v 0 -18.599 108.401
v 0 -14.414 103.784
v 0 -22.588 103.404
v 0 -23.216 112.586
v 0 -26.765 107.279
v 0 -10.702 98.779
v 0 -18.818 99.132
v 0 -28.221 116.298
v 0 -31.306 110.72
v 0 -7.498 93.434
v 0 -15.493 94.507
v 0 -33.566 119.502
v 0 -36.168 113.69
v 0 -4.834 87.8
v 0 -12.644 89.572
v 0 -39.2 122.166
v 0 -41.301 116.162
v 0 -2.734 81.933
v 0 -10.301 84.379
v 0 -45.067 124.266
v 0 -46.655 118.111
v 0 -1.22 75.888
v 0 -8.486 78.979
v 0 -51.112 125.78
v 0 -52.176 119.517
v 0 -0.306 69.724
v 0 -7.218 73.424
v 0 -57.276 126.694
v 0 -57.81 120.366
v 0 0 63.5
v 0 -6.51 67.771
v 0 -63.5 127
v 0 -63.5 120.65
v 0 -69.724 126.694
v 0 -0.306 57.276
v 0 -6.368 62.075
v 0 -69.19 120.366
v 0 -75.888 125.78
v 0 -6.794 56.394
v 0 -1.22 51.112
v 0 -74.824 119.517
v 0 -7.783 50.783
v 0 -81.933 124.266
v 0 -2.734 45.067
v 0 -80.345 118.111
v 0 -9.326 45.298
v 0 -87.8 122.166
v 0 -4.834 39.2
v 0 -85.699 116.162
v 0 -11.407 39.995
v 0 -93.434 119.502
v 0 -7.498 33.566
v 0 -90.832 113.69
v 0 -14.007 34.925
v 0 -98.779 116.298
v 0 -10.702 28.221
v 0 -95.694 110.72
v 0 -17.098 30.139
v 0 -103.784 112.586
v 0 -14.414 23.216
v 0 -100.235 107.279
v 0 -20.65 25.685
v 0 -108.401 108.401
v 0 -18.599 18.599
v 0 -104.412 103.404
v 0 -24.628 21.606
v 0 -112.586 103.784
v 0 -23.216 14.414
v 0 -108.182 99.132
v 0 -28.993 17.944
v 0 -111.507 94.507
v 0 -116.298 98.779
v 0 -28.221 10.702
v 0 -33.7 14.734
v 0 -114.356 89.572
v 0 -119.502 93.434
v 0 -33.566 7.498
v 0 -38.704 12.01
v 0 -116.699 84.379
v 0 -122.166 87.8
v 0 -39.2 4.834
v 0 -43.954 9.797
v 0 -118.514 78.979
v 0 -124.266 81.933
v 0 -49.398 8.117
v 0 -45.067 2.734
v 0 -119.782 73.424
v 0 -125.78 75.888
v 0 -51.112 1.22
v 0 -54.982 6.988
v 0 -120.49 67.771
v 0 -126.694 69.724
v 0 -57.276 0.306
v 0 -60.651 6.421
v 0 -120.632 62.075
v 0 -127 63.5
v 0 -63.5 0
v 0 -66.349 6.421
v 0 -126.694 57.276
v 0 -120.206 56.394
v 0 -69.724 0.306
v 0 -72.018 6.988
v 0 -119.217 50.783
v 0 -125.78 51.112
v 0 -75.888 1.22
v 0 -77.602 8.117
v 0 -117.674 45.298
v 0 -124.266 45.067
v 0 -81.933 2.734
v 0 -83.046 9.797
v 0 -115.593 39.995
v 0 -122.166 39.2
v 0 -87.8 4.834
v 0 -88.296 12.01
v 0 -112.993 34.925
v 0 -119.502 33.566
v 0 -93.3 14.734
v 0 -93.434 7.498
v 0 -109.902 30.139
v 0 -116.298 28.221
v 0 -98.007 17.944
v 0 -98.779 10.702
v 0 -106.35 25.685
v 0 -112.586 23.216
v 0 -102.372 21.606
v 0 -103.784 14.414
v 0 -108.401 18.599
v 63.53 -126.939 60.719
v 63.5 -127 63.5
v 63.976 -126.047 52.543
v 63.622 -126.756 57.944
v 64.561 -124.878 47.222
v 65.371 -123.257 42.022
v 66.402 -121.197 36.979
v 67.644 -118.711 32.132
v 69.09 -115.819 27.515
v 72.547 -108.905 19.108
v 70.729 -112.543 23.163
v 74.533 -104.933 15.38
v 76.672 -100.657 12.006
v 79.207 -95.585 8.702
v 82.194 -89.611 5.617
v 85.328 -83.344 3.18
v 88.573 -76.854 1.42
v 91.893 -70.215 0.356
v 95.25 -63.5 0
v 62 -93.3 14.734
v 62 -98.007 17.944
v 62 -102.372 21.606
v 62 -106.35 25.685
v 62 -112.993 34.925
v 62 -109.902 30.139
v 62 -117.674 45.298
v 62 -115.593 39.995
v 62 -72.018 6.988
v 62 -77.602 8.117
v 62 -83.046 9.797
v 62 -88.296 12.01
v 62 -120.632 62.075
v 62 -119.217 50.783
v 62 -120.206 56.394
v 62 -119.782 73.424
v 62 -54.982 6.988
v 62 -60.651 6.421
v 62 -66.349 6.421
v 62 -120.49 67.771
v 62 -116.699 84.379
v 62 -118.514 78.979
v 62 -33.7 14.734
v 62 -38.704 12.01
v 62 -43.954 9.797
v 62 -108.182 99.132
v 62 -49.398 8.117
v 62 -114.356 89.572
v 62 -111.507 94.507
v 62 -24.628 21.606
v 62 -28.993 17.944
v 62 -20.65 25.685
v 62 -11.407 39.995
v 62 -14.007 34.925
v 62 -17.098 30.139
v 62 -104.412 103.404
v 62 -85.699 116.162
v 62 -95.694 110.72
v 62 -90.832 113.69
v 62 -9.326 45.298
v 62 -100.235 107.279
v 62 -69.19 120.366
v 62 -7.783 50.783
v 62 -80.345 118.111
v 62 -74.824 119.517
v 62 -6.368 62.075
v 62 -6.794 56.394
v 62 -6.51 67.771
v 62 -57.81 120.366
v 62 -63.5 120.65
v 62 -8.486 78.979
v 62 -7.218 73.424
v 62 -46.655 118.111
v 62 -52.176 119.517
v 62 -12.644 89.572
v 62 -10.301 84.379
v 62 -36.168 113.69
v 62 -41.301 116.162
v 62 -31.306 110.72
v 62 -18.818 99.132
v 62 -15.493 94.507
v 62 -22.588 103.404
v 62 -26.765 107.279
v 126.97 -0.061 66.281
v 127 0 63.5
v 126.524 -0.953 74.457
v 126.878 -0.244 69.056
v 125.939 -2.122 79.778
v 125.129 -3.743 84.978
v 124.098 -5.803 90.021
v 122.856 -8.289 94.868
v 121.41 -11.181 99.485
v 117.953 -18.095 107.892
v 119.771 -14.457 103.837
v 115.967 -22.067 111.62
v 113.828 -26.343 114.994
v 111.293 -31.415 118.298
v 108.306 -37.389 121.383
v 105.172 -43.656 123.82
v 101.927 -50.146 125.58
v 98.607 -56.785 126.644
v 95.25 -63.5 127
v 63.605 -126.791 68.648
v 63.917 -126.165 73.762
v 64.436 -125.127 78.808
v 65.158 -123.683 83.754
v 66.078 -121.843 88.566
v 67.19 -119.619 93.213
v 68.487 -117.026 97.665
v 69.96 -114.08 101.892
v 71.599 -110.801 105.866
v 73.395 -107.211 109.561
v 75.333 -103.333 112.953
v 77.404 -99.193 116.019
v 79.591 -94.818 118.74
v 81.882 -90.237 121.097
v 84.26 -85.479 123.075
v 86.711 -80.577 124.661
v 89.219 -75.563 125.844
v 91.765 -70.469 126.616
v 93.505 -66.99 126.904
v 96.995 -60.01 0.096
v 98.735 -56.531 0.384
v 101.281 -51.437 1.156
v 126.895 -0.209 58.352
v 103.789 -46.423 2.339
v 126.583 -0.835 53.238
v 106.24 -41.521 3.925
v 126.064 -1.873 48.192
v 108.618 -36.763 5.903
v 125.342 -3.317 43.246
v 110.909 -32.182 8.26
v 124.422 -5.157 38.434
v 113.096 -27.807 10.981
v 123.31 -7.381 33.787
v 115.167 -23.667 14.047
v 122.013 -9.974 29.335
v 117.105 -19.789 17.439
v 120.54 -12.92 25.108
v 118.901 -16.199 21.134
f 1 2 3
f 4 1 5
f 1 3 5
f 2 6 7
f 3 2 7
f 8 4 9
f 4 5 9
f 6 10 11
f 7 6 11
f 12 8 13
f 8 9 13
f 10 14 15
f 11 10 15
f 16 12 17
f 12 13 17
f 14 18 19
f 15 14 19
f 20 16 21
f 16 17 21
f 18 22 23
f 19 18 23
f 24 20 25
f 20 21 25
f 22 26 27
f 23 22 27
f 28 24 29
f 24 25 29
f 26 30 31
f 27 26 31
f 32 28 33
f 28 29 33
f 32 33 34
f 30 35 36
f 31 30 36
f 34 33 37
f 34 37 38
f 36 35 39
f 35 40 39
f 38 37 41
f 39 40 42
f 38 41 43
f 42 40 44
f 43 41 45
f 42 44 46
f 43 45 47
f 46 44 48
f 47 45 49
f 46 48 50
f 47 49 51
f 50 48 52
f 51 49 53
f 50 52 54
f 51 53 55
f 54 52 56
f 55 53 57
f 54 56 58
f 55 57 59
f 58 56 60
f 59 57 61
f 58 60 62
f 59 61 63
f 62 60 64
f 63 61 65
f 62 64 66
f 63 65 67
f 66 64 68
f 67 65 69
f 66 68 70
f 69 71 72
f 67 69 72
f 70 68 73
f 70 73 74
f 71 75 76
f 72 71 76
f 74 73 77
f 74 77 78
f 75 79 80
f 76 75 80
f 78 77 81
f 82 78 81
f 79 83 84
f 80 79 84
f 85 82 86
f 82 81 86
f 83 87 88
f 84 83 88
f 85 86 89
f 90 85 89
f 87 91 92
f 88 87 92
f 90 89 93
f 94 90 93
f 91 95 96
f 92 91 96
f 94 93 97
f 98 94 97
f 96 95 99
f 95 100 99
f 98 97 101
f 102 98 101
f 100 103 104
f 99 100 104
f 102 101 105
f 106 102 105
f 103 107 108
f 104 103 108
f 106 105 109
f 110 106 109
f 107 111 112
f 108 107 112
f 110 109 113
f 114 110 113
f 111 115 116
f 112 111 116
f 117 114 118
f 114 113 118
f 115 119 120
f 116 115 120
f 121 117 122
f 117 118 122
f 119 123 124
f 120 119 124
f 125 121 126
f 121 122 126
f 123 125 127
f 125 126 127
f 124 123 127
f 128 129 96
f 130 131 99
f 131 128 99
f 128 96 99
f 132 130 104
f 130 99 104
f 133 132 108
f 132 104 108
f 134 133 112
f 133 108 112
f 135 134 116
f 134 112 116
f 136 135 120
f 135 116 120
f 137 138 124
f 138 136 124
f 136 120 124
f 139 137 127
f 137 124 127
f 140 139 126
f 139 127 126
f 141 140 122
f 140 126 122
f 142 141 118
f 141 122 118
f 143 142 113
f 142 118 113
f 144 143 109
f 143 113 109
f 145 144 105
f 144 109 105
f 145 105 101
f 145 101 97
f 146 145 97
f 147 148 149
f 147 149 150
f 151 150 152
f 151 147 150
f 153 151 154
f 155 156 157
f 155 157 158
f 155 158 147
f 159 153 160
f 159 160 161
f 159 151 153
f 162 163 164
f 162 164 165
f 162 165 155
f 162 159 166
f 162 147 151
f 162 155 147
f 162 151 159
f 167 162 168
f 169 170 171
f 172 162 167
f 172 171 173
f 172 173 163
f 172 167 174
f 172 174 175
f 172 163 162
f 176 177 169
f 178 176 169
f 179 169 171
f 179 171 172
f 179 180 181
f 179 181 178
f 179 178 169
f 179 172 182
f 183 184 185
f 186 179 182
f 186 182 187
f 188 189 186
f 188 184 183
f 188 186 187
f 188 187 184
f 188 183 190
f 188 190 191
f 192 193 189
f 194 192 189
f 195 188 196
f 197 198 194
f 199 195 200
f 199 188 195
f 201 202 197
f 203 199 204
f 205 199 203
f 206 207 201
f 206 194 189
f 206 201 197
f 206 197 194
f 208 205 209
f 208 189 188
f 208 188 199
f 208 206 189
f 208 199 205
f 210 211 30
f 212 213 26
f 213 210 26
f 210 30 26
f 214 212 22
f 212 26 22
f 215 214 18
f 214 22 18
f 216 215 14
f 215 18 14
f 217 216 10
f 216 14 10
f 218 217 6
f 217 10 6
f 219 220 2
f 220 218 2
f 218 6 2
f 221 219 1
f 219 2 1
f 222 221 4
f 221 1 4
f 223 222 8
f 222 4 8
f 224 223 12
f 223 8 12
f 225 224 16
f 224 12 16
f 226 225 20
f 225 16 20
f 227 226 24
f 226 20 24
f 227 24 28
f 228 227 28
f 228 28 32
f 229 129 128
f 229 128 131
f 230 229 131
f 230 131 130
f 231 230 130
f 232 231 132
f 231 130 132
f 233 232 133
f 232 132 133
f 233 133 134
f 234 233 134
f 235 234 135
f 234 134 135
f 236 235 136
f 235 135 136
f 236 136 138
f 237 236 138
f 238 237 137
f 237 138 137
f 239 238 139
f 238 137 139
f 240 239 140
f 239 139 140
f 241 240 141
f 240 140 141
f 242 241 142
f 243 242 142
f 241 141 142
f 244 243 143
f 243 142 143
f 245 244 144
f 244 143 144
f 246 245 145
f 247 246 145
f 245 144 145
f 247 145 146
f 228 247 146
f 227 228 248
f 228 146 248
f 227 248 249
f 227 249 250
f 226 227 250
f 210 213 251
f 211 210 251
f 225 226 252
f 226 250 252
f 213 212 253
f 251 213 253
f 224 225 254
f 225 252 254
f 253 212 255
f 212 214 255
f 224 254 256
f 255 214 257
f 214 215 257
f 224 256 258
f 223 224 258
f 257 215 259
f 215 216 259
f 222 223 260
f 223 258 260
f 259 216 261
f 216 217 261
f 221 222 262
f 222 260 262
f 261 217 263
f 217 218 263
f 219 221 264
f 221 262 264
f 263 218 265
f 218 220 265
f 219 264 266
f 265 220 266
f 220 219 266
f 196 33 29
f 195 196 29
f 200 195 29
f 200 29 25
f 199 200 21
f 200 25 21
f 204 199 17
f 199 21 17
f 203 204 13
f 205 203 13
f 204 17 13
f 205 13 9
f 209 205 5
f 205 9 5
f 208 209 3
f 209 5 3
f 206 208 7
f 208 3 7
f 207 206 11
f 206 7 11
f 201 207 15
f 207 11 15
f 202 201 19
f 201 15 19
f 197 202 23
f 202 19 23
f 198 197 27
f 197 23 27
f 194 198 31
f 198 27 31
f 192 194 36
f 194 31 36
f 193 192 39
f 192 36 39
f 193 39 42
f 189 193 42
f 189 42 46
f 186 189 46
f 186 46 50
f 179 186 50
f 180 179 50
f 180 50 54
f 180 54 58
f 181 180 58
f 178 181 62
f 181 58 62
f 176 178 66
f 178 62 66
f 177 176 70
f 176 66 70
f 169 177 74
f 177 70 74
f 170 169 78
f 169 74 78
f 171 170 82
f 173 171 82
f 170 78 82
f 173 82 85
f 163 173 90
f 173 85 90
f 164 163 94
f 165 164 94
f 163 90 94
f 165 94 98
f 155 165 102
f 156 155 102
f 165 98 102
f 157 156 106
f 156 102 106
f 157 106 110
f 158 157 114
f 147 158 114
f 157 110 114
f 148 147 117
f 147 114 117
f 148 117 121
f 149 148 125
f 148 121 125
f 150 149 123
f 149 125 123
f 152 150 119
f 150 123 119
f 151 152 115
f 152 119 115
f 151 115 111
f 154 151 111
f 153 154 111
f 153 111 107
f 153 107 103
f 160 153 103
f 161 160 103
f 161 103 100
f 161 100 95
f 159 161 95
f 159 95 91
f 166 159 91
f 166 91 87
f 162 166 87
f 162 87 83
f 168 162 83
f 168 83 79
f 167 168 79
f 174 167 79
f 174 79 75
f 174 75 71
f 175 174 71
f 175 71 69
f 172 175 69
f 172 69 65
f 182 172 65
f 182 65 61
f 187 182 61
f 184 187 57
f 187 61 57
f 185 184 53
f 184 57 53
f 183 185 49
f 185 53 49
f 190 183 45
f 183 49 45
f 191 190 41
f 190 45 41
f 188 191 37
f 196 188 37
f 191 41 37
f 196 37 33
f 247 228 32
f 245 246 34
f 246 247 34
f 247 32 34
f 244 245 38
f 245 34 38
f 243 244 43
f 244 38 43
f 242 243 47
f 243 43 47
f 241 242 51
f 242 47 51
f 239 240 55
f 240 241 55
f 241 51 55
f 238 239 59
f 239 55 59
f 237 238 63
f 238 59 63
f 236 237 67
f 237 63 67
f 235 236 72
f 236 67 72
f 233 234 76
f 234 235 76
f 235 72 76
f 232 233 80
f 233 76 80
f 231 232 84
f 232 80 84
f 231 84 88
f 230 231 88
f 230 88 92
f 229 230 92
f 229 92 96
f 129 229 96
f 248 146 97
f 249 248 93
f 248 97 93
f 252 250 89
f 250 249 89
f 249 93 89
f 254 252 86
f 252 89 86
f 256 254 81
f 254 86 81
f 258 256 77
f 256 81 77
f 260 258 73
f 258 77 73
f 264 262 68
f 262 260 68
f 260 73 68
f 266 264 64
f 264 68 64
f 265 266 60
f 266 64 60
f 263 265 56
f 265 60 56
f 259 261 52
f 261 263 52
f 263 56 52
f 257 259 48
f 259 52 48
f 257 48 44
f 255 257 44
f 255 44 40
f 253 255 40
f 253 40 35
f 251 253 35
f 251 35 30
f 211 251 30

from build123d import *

# Parameters (mm, degrees)
BOSS_EXTRUDE2_DEPTH = 127
SKETCH3_R           = 57.15
CUT_EXTRUDE1_DEPTH  = 62
CUT_EXTRUDE2_DEPTH  = 128


with BuildPart() as part:
    # Sketch2 → Boss-Extrude2 (new body)
    with BuildSketch(Plane.XY):
        Polygon((0, 0), (0, -127), (63.5, -127), (127, 0), align=None)
    extrude(amount=BOSS_EXTRUDE2_DEPTH)

    # Sketch3 → Cut-Extrude1 (cut)
    with BuildSketch(Plane.ZY):
        with Locations((63.5, -63.5)):
            Circle(SKETCH3_R)
    extrude(amount=-CUT_EXTRUDE1_DEPTH, mode=Mode.SUBTRACT)

    # Sketch4 → Cut-Extrude2 (cut, through all)
    with BuildSketch(Plane.ZY):
        with BuildLine():
            Line((127, 0), (63.5, 0))
            ThreePointArc((63.5, 0), (108.401280605, -18.598719395), (127, -63.5))
            Line((127, -63.5), (127, 0))
        make_face()
        with BuildLine():
            Line((63.5, 0), (0, 0))
            Line((0, 0), (0, -63.5))
            ThreePointArc((0, -63.5), (18.598719395, -18.598719395), (63.5, 0))
        make_face()
        with BuildLine():
            ThreePointArc((63.5, -127), (18.598719395, -108.401280605), (0, -63.5))
            Line((0, -63.5), (0, -127))
            Line((0, -127), (63.5, -127))
        make_face()
        with BuildLine():
            Line((127, -127), (127, -63.5))
            ThreePointArc((127, -63.5), (108.401280605, -108.401280605), (63.5, -127))
            Line((63.5, -127), (127, -127))
        make_face()
    extrude(amount=-CUT_EXTRUDE2_DEPTH, mode=Mode.SUBTRACT)


solid = part.part
